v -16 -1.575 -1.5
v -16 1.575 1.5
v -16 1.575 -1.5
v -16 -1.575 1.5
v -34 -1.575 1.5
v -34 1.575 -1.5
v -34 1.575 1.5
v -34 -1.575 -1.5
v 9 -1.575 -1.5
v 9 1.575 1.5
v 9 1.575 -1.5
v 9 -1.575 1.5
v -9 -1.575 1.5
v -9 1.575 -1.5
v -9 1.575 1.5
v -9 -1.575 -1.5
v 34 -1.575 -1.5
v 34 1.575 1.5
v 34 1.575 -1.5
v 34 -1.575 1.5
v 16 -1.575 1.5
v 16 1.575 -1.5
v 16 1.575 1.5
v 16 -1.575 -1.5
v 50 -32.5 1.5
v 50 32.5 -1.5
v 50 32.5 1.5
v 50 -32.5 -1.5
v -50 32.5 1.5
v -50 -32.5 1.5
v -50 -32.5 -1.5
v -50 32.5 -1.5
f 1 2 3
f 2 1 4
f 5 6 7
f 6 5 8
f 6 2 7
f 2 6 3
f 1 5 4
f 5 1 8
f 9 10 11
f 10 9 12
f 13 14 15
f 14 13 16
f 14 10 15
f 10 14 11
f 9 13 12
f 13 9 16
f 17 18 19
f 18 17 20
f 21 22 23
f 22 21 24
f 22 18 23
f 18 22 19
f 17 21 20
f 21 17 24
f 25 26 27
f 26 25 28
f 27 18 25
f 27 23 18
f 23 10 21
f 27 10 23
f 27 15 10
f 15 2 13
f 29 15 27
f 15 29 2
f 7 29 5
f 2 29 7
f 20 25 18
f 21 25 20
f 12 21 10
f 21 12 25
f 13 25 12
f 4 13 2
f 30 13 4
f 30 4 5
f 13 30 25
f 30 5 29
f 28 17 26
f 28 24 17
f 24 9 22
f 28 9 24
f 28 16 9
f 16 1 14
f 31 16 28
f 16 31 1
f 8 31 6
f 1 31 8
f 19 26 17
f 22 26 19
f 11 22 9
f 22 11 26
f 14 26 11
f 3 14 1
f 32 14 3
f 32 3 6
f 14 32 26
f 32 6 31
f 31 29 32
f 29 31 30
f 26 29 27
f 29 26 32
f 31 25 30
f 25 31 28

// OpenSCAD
// Laser-cut plywood tab-slot panel, units: mm

material_thickness_mm = 3.0;
kerf_mm = 0.2;

panel_length_mm = 100;
panel_width_mm = 65;

slot_count = 3;
slot_length_mm = 18;
slot_width_mm = 3.15;
slot_spacing_center_mm = 25;
min_web_mm = slot_spacing_center_mm - slot_length_mm;

echo(str(
    "MAKERBENCH-LASER2D: {",
    "\"material_thickness_mm\": ", material_thickness_mm, ", ",
    "\"kerf_mm\": ", kerf_mm, ", ",
    "\"slot_count\": ", slot_count, ", ",
    "\"slot_length_mm\": ", slot_length_mm, ", ",
    "\"slot_width_mm\": ", slot_width_mm, ", ",
    "\"min_web_mm\": ", min_web_mm,
    "}"
));

module slot() {
    cube([slot_length_mm, slot_width_mm, material_thickness_mm + 2], center = true);
}

difference() {
    cube([panel_length_mm, panel_width_mm, material_thickness_mm], center = true);

    for (x = [-slot_spacing_center_mm, 0, slot_spacing_center_mm]) {
        translate([x, 0, 0])
            slot();
    }
}
